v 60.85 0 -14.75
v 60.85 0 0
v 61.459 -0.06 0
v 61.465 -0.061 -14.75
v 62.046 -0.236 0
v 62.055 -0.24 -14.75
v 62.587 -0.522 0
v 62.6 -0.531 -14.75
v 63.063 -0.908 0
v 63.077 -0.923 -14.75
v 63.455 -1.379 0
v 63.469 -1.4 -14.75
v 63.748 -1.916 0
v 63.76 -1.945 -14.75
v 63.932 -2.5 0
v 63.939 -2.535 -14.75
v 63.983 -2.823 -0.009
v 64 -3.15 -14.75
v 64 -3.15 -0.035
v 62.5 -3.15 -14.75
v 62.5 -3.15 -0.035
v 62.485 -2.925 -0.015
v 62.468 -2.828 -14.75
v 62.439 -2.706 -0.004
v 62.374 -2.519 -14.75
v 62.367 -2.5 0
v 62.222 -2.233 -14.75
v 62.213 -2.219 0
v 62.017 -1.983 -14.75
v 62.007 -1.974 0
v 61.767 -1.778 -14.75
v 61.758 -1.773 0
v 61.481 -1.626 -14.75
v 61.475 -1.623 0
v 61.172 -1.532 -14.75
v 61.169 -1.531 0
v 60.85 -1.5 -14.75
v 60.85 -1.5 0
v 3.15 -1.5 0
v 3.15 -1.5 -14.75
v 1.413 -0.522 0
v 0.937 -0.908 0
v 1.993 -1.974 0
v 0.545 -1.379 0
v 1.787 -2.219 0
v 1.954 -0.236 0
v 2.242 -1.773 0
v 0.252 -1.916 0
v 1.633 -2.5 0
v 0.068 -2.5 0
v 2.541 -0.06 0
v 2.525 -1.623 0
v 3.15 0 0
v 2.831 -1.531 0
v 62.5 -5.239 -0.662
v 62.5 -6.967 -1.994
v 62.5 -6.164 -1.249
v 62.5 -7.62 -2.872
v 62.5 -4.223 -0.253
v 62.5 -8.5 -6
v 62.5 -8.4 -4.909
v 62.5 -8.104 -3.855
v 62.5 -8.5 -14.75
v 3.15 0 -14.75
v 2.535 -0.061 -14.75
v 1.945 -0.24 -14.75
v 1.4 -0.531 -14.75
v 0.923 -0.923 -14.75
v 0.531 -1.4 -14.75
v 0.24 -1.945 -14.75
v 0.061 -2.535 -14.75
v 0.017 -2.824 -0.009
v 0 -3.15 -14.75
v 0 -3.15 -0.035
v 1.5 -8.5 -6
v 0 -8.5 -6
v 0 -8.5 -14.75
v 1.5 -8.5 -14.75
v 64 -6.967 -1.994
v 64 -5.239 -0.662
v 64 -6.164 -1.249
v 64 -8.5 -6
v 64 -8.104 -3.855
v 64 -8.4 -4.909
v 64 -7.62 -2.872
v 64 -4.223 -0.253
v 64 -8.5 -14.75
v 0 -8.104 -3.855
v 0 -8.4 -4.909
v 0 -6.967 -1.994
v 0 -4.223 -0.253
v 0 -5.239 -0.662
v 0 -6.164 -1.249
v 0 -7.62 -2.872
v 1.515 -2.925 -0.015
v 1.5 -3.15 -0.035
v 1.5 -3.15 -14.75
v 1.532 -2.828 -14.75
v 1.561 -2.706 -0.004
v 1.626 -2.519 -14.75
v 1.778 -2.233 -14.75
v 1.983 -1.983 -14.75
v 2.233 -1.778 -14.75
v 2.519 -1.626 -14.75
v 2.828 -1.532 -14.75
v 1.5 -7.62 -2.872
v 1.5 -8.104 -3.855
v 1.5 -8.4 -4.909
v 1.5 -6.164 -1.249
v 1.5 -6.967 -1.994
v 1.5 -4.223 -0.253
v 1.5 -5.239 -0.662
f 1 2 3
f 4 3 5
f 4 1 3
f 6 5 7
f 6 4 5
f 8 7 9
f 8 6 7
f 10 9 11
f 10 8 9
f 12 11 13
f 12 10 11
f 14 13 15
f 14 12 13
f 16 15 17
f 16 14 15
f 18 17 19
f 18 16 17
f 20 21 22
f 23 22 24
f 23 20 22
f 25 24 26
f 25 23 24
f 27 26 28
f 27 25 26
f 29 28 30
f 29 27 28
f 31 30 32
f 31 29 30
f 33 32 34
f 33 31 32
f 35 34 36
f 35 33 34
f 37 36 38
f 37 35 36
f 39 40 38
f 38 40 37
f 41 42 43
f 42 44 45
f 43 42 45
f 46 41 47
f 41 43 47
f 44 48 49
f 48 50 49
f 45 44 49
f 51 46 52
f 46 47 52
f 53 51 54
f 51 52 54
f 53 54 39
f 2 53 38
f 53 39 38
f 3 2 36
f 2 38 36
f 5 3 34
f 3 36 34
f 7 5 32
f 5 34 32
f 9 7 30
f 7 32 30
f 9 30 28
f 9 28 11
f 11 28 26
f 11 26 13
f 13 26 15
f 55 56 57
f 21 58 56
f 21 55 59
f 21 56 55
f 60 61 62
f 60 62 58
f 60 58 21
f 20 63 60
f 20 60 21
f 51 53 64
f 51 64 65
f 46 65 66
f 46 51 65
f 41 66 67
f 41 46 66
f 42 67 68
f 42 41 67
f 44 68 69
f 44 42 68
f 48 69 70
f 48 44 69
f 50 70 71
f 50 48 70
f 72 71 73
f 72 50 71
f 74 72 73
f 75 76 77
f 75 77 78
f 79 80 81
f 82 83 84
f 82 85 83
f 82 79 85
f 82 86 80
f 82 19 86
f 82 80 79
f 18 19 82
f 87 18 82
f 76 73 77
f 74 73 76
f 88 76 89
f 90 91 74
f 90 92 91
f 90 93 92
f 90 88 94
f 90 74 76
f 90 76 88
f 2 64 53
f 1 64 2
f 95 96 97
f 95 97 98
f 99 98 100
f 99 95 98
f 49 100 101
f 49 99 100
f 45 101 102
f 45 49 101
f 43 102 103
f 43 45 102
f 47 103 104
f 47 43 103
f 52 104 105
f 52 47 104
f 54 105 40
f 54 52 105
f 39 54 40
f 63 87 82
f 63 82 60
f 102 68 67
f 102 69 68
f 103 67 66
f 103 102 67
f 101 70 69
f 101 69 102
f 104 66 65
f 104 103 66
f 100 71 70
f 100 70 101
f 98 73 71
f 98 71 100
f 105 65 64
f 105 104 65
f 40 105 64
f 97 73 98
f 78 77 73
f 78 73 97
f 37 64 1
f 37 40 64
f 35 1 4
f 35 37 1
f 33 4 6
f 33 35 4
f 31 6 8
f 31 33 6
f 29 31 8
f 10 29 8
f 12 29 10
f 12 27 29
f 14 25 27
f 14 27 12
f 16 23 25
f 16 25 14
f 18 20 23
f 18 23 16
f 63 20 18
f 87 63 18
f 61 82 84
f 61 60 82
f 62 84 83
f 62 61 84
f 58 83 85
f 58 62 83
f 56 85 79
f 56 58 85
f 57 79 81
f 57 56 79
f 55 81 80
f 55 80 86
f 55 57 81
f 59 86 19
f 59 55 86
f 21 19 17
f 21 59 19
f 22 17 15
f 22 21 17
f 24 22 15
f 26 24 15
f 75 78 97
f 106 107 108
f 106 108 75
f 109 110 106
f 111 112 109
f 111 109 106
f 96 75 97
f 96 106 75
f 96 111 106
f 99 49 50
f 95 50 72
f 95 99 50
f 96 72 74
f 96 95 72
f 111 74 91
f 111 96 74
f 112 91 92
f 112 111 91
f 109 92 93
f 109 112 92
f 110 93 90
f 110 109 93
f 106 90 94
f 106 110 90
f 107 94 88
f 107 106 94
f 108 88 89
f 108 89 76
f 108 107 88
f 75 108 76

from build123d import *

# Parameters (mm, degrees)
SKETCH1_W                      = 64
SKETCH1_H                      = 14.75
BASE_FLANGE1_DEPTH             = 1.5
EDGE_FLANGE1_STRIP_W           = 9.3
EDGE_FLANGE1_STRIP_H           = 1.5
EDGE_FLANGE1_STRIP_CUT_DEPTH   = 14.75
EDGE_FLANGE1_STRIP_2_W         = 9.3
EDGE_FLANGE1_STRIP_2_H         = 1.5
EDGE_FLANGE1_STRIP_CUT_2_DEPTH = 14.75
EDGE_FLANGE1_DEPTH             = 14.75
EDGE_FLANGE1_BEND_DEPTH        = 14.75
FILLET1_R                      = 6


# Sheet-metal steps are written as plain solids
with BuildPart() as part:
    # Sketch1 → Base-Flange1 (new body)
    with BuildSketch(Plane(origin=(0, 0, 0), x_dir=(1, 0, 0), z_dir=(0, 1, 0))):
        with Locations((32, 7.375)):
            Rectangle(SKETCH1_W, SKETCH1_H)
    extrude(amount=-BASE_FLANGE1_DEPTH)

    # Edge-Flange1 strip (across the edge) → Edge-Flange1 strip cut (cut)
    with BuildSketch(Plane(origin=(0, -1.5, 0), x_dir=(1, 0, 0), z_dir=(0, 0, -1))):
        with Locations((-1.5, -0.75)):
            Rectangle(EDGE_FLANGE1_STRIP_W, EDGE_FLANGE1_STRIP_H)
    extrude(amount=EDGE_FLANGE1_STRIP_CUT_DEPTH, mode=Mode.SUBTRACT)

    # Edge-Flange1 strip 2 (across the edge) → Edge-Flange1 strip cut 2 (cut)
    with BuildSketch(Plane(origin=(64, -1.5, -14.75), x_dir=(-1, 0, 0), z_dir=(0, 0, 1))):
        with Locations((-1.5, -0.75)):
            Rectangle(EDGE_FLANGE1_STRIP_2_W, EDGE_FLANGE1_STRIP_2_H)
    extrude(amount=EDGE_FLANGE1_STRIP_CUT_2_DEPTH, mode=Mode.SUBTRACT)

    # Edge-Flange1 section (across the edge) → Edge-Flange1 (add)
    with BuildSketch(Plane(origin=(0, -1.5, 0), x_dir=(1, 0, 0), z_dir=(0, 0, -1))):
        with BuildLine():
            Line((0, 1.65), (0, 7))
            Line((0, 7), (1.5, 7))
            Line((1.5, 7), (1.5, 1.65))
            ThreePointArc((1.5, 1.65), (1.983273811, 0.483273811), (3.15, 0))
            Line((3.15, 0), (3.15, -1.5))
            ThreePointArc((3.15, -1.5), (0.922613639, -0.577386361), (0, 1.65))
        make_face()
    extrude(amount=EDGE_FLANGE1_DEPTH)

    # Edge-Flange1 section 2 (across the edge) → Edge-Flange1 bend (add)
    with BuildSketch(Plane(origin=(64, -1.5, -14.75), x_dir=(-1, 0, 0), z_dir=(0, 0, 1))):
        with BuildLine():
            Line((0, 1.65), (0, 7))
            Line((0, 7), (1.5, 7))
            Line((1.5, 7), (1.5, 1.65))
            ThreePointArc((1.5, 1.65), (1.983273811, 0.483273811), (3.15, 0))
            Line((3.15, 0), (3.15, -1.5))
            ThreePointArc((3.15, -1.5), (0.922613639, -0.577386361), (0, 1.65))
        make_face()
    extrude(amount=EDGE_FLANGE1_BEND_DEPTH)

    # Fillet1
    fillet1_edges = [part.edges().sort_by_distance(p)[0] for p in [
        (0.75, -8.5, 0),
        (63.25, -8.5, 0),
    ]]
    fillet(fillet1_edges, radius=FILLET1_R)


solid = part.part
